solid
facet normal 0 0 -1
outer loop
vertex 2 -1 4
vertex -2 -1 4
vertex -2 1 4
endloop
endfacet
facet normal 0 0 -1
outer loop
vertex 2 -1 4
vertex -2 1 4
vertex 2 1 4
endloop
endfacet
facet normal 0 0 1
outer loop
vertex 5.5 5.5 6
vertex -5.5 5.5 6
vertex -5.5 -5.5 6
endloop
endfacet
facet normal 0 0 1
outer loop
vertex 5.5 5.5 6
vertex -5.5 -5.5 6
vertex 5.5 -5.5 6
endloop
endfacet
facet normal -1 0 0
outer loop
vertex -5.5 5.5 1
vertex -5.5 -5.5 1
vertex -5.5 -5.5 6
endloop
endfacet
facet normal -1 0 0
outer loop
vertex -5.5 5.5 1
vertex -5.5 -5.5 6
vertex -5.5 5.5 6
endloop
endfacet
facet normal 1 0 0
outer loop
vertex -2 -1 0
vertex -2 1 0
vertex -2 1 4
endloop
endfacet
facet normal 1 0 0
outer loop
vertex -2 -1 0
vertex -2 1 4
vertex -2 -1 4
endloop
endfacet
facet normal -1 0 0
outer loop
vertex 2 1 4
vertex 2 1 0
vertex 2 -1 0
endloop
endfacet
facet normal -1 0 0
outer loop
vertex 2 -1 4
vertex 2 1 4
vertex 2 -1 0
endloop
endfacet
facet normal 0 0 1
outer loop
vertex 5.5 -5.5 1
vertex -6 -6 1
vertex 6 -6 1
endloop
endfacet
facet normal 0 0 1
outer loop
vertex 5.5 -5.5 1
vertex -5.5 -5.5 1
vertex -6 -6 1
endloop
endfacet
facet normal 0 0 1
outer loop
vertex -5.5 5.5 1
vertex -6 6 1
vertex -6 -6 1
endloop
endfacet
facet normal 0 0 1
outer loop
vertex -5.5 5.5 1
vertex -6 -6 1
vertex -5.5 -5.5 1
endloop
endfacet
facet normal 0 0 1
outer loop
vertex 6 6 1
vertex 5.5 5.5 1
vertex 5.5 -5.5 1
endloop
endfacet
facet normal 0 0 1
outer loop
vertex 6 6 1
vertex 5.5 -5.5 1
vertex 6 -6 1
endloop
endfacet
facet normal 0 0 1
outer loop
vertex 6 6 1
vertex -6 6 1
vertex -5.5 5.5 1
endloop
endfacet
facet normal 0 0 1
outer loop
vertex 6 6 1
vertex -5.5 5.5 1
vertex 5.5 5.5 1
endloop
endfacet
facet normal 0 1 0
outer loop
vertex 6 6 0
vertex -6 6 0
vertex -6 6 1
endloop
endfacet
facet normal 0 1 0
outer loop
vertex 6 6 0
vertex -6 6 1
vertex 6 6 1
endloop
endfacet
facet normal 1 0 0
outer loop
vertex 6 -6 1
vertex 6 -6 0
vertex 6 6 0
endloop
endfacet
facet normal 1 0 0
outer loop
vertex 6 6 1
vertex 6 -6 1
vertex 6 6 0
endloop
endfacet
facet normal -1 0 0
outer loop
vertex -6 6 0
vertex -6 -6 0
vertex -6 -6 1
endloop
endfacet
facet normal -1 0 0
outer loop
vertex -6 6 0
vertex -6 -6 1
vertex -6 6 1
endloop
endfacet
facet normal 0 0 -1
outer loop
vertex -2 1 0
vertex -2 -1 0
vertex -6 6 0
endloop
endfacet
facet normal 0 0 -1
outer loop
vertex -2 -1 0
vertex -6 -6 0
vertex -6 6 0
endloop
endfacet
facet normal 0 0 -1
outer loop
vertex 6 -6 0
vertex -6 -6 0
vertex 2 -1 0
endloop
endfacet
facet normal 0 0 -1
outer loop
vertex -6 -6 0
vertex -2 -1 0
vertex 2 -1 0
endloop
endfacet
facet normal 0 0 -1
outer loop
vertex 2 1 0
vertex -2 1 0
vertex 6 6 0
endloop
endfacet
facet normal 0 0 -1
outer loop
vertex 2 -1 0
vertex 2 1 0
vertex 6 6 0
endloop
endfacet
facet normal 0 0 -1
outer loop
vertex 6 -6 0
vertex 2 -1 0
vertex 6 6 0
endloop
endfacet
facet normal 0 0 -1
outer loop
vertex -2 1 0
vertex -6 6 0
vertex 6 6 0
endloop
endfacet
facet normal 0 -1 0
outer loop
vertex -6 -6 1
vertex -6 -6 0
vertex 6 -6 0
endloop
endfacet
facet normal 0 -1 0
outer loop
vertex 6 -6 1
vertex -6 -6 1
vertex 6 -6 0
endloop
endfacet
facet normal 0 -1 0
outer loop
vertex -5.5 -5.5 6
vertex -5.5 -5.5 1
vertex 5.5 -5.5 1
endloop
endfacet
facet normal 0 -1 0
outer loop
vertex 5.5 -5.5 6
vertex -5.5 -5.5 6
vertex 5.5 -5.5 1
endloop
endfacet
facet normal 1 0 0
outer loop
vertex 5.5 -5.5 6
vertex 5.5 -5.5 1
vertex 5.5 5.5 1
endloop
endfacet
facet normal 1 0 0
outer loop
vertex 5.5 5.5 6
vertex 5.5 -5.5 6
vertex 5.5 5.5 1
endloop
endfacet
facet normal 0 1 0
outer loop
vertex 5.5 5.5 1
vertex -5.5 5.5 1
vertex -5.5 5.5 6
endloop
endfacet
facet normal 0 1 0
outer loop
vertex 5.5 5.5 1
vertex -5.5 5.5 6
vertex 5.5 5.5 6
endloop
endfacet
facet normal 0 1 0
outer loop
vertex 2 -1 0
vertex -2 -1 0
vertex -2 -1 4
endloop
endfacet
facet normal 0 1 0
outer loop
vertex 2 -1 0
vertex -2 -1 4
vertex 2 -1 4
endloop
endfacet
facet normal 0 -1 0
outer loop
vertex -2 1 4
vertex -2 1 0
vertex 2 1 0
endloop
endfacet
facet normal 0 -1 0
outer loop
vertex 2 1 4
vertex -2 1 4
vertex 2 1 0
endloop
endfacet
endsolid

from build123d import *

# Parameters (mm, degrees)
F1_W     = 11
F1_H     = 11
F2_DEPTH = 6
F0_W     = 12
F0_H     = 12
F3_DEPTH = 1
F4_W     = 4
F4_H     = 2
F5_DEPTH = 4


with BuildPart() as f2:
    # F1 (on face) → F2 (new body)
    with BuildSketch(Plane.XY):
        Rectangle(F1_W, F1_H)
    extrude(amount=F2_DEPTH)

    # F0 (on Top) → F3 (join)
    with BuildSketch(Plane.XY):
        Rectangle(F0_W, F0_H)
    extrude(amount=F3_DEPTH)

    # F4 (on face) → F5 (cut)
    with BuildSketch(Plane(origin=(0, 0, 0), x_dir=(1, 0, 0), z_dir=(0, 0, -1))):
        Rectangle(F4_W, F4_H)
    extrude(amount=-F5_DEPTH, mode=Mode.SUBTRACT)


solid = f2.part
